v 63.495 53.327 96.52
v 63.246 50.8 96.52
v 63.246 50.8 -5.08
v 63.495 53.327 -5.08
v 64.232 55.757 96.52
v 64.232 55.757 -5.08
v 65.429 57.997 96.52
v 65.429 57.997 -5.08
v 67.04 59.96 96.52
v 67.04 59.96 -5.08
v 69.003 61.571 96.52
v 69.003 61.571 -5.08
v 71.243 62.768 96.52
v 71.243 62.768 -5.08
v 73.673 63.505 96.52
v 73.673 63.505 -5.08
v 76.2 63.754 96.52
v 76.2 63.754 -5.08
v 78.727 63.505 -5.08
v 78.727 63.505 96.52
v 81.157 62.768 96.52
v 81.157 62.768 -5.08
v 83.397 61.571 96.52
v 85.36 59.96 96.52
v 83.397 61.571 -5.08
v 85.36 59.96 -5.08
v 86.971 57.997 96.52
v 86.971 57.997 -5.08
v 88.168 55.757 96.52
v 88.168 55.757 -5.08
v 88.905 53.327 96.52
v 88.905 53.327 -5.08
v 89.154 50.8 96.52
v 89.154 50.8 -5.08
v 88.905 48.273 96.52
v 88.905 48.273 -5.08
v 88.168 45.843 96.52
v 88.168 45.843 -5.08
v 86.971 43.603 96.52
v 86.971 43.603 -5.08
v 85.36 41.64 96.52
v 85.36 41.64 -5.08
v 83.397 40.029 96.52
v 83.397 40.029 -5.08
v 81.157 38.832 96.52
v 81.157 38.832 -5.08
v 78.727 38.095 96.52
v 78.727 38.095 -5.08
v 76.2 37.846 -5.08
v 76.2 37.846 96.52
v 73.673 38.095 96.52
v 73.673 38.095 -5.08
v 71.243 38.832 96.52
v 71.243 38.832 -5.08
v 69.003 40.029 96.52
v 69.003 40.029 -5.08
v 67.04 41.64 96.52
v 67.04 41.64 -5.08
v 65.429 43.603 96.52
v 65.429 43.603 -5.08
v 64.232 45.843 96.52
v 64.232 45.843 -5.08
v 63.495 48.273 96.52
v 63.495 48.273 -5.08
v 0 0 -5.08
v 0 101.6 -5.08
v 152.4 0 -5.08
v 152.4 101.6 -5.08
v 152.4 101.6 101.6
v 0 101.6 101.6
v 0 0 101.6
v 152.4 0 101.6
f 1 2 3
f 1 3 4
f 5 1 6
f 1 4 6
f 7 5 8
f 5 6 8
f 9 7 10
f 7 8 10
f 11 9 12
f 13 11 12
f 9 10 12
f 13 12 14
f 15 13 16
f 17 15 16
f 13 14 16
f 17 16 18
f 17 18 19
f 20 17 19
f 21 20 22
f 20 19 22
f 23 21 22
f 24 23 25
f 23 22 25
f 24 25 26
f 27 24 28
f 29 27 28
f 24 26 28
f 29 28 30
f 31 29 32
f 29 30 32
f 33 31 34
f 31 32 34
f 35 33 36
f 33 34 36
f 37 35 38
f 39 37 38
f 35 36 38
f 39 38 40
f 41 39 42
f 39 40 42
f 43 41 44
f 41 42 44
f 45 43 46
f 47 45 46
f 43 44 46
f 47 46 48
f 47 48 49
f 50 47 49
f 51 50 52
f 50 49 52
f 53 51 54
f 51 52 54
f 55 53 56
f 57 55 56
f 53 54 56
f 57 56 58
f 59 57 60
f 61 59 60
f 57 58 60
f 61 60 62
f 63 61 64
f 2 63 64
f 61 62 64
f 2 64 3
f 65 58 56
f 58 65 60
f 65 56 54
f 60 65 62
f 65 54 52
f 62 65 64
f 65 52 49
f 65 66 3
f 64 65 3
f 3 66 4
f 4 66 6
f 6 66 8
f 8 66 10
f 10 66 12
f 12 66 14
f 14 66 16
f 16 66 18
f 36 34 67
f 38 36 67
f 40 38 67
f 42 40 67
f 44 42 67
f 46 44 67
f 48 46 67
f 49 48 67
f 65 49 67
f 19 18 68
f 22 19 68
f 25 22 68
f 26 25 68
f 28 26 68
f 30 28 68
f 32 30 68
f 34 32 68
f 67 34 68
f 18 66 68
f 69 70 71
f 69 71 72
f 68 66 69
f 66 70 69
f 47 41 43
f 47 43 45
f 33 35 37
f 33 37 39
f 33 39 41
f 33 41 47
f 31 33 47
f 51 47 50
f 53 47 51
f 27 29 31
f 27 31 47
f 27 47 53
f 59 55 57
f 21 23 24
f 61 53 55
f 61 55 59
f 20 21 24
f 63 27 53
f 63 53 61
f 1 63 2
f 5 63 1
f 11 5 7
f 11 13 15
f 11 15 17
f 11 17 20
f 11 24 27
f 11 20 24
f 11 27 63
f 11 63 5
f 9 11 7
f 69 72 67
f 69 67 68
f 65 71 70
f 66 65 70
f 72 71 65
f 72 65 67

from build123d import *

# Parameters (mm, degrees)
SKETCH1_W                = 152.4
SKETCH1_H                = 101.6
BOSS_EXTRUDE1_DEPTH      = 101.6
BOSS_EXTRUDE1_DEPTH_BACK = 5.08
SKETCH2_R                = 12.954
CUT_EXTRUDE1_DEPTH       = 101.6


with BuildPart() as part:
    # Sketch1 → Boss-Extrude1 (new body, two sides)
    with BuildSketch(Plane.XY) as boss_extrude1_sk:
        with Locations((76.2, 50.8)):
            Rectangle(SKETCH1_W, SKETCH1_H)
    extrude(amount=BOSS_EXTRUDE1_DEPTH)
    extrude(boss_extrude1_sk.sketch, amount=-BOSS_EXTRUDE1_DEPTH_BACK)

    # Sketch2 → Cut-Extrude1 (cut)
    with BuildSketch(Plane(origin=(0, 0, -5.08), x_dir=(-1, 0, 0), z_dir=(0, 0, -1))):
        with Locations((-76.2, 50.8)):
            Circle(SKETCH2_R)
    extrude(amount=-CUT_EXTRUDE1_DEPTH, mode=Mode.SUBTRACT)


solid = part.part
